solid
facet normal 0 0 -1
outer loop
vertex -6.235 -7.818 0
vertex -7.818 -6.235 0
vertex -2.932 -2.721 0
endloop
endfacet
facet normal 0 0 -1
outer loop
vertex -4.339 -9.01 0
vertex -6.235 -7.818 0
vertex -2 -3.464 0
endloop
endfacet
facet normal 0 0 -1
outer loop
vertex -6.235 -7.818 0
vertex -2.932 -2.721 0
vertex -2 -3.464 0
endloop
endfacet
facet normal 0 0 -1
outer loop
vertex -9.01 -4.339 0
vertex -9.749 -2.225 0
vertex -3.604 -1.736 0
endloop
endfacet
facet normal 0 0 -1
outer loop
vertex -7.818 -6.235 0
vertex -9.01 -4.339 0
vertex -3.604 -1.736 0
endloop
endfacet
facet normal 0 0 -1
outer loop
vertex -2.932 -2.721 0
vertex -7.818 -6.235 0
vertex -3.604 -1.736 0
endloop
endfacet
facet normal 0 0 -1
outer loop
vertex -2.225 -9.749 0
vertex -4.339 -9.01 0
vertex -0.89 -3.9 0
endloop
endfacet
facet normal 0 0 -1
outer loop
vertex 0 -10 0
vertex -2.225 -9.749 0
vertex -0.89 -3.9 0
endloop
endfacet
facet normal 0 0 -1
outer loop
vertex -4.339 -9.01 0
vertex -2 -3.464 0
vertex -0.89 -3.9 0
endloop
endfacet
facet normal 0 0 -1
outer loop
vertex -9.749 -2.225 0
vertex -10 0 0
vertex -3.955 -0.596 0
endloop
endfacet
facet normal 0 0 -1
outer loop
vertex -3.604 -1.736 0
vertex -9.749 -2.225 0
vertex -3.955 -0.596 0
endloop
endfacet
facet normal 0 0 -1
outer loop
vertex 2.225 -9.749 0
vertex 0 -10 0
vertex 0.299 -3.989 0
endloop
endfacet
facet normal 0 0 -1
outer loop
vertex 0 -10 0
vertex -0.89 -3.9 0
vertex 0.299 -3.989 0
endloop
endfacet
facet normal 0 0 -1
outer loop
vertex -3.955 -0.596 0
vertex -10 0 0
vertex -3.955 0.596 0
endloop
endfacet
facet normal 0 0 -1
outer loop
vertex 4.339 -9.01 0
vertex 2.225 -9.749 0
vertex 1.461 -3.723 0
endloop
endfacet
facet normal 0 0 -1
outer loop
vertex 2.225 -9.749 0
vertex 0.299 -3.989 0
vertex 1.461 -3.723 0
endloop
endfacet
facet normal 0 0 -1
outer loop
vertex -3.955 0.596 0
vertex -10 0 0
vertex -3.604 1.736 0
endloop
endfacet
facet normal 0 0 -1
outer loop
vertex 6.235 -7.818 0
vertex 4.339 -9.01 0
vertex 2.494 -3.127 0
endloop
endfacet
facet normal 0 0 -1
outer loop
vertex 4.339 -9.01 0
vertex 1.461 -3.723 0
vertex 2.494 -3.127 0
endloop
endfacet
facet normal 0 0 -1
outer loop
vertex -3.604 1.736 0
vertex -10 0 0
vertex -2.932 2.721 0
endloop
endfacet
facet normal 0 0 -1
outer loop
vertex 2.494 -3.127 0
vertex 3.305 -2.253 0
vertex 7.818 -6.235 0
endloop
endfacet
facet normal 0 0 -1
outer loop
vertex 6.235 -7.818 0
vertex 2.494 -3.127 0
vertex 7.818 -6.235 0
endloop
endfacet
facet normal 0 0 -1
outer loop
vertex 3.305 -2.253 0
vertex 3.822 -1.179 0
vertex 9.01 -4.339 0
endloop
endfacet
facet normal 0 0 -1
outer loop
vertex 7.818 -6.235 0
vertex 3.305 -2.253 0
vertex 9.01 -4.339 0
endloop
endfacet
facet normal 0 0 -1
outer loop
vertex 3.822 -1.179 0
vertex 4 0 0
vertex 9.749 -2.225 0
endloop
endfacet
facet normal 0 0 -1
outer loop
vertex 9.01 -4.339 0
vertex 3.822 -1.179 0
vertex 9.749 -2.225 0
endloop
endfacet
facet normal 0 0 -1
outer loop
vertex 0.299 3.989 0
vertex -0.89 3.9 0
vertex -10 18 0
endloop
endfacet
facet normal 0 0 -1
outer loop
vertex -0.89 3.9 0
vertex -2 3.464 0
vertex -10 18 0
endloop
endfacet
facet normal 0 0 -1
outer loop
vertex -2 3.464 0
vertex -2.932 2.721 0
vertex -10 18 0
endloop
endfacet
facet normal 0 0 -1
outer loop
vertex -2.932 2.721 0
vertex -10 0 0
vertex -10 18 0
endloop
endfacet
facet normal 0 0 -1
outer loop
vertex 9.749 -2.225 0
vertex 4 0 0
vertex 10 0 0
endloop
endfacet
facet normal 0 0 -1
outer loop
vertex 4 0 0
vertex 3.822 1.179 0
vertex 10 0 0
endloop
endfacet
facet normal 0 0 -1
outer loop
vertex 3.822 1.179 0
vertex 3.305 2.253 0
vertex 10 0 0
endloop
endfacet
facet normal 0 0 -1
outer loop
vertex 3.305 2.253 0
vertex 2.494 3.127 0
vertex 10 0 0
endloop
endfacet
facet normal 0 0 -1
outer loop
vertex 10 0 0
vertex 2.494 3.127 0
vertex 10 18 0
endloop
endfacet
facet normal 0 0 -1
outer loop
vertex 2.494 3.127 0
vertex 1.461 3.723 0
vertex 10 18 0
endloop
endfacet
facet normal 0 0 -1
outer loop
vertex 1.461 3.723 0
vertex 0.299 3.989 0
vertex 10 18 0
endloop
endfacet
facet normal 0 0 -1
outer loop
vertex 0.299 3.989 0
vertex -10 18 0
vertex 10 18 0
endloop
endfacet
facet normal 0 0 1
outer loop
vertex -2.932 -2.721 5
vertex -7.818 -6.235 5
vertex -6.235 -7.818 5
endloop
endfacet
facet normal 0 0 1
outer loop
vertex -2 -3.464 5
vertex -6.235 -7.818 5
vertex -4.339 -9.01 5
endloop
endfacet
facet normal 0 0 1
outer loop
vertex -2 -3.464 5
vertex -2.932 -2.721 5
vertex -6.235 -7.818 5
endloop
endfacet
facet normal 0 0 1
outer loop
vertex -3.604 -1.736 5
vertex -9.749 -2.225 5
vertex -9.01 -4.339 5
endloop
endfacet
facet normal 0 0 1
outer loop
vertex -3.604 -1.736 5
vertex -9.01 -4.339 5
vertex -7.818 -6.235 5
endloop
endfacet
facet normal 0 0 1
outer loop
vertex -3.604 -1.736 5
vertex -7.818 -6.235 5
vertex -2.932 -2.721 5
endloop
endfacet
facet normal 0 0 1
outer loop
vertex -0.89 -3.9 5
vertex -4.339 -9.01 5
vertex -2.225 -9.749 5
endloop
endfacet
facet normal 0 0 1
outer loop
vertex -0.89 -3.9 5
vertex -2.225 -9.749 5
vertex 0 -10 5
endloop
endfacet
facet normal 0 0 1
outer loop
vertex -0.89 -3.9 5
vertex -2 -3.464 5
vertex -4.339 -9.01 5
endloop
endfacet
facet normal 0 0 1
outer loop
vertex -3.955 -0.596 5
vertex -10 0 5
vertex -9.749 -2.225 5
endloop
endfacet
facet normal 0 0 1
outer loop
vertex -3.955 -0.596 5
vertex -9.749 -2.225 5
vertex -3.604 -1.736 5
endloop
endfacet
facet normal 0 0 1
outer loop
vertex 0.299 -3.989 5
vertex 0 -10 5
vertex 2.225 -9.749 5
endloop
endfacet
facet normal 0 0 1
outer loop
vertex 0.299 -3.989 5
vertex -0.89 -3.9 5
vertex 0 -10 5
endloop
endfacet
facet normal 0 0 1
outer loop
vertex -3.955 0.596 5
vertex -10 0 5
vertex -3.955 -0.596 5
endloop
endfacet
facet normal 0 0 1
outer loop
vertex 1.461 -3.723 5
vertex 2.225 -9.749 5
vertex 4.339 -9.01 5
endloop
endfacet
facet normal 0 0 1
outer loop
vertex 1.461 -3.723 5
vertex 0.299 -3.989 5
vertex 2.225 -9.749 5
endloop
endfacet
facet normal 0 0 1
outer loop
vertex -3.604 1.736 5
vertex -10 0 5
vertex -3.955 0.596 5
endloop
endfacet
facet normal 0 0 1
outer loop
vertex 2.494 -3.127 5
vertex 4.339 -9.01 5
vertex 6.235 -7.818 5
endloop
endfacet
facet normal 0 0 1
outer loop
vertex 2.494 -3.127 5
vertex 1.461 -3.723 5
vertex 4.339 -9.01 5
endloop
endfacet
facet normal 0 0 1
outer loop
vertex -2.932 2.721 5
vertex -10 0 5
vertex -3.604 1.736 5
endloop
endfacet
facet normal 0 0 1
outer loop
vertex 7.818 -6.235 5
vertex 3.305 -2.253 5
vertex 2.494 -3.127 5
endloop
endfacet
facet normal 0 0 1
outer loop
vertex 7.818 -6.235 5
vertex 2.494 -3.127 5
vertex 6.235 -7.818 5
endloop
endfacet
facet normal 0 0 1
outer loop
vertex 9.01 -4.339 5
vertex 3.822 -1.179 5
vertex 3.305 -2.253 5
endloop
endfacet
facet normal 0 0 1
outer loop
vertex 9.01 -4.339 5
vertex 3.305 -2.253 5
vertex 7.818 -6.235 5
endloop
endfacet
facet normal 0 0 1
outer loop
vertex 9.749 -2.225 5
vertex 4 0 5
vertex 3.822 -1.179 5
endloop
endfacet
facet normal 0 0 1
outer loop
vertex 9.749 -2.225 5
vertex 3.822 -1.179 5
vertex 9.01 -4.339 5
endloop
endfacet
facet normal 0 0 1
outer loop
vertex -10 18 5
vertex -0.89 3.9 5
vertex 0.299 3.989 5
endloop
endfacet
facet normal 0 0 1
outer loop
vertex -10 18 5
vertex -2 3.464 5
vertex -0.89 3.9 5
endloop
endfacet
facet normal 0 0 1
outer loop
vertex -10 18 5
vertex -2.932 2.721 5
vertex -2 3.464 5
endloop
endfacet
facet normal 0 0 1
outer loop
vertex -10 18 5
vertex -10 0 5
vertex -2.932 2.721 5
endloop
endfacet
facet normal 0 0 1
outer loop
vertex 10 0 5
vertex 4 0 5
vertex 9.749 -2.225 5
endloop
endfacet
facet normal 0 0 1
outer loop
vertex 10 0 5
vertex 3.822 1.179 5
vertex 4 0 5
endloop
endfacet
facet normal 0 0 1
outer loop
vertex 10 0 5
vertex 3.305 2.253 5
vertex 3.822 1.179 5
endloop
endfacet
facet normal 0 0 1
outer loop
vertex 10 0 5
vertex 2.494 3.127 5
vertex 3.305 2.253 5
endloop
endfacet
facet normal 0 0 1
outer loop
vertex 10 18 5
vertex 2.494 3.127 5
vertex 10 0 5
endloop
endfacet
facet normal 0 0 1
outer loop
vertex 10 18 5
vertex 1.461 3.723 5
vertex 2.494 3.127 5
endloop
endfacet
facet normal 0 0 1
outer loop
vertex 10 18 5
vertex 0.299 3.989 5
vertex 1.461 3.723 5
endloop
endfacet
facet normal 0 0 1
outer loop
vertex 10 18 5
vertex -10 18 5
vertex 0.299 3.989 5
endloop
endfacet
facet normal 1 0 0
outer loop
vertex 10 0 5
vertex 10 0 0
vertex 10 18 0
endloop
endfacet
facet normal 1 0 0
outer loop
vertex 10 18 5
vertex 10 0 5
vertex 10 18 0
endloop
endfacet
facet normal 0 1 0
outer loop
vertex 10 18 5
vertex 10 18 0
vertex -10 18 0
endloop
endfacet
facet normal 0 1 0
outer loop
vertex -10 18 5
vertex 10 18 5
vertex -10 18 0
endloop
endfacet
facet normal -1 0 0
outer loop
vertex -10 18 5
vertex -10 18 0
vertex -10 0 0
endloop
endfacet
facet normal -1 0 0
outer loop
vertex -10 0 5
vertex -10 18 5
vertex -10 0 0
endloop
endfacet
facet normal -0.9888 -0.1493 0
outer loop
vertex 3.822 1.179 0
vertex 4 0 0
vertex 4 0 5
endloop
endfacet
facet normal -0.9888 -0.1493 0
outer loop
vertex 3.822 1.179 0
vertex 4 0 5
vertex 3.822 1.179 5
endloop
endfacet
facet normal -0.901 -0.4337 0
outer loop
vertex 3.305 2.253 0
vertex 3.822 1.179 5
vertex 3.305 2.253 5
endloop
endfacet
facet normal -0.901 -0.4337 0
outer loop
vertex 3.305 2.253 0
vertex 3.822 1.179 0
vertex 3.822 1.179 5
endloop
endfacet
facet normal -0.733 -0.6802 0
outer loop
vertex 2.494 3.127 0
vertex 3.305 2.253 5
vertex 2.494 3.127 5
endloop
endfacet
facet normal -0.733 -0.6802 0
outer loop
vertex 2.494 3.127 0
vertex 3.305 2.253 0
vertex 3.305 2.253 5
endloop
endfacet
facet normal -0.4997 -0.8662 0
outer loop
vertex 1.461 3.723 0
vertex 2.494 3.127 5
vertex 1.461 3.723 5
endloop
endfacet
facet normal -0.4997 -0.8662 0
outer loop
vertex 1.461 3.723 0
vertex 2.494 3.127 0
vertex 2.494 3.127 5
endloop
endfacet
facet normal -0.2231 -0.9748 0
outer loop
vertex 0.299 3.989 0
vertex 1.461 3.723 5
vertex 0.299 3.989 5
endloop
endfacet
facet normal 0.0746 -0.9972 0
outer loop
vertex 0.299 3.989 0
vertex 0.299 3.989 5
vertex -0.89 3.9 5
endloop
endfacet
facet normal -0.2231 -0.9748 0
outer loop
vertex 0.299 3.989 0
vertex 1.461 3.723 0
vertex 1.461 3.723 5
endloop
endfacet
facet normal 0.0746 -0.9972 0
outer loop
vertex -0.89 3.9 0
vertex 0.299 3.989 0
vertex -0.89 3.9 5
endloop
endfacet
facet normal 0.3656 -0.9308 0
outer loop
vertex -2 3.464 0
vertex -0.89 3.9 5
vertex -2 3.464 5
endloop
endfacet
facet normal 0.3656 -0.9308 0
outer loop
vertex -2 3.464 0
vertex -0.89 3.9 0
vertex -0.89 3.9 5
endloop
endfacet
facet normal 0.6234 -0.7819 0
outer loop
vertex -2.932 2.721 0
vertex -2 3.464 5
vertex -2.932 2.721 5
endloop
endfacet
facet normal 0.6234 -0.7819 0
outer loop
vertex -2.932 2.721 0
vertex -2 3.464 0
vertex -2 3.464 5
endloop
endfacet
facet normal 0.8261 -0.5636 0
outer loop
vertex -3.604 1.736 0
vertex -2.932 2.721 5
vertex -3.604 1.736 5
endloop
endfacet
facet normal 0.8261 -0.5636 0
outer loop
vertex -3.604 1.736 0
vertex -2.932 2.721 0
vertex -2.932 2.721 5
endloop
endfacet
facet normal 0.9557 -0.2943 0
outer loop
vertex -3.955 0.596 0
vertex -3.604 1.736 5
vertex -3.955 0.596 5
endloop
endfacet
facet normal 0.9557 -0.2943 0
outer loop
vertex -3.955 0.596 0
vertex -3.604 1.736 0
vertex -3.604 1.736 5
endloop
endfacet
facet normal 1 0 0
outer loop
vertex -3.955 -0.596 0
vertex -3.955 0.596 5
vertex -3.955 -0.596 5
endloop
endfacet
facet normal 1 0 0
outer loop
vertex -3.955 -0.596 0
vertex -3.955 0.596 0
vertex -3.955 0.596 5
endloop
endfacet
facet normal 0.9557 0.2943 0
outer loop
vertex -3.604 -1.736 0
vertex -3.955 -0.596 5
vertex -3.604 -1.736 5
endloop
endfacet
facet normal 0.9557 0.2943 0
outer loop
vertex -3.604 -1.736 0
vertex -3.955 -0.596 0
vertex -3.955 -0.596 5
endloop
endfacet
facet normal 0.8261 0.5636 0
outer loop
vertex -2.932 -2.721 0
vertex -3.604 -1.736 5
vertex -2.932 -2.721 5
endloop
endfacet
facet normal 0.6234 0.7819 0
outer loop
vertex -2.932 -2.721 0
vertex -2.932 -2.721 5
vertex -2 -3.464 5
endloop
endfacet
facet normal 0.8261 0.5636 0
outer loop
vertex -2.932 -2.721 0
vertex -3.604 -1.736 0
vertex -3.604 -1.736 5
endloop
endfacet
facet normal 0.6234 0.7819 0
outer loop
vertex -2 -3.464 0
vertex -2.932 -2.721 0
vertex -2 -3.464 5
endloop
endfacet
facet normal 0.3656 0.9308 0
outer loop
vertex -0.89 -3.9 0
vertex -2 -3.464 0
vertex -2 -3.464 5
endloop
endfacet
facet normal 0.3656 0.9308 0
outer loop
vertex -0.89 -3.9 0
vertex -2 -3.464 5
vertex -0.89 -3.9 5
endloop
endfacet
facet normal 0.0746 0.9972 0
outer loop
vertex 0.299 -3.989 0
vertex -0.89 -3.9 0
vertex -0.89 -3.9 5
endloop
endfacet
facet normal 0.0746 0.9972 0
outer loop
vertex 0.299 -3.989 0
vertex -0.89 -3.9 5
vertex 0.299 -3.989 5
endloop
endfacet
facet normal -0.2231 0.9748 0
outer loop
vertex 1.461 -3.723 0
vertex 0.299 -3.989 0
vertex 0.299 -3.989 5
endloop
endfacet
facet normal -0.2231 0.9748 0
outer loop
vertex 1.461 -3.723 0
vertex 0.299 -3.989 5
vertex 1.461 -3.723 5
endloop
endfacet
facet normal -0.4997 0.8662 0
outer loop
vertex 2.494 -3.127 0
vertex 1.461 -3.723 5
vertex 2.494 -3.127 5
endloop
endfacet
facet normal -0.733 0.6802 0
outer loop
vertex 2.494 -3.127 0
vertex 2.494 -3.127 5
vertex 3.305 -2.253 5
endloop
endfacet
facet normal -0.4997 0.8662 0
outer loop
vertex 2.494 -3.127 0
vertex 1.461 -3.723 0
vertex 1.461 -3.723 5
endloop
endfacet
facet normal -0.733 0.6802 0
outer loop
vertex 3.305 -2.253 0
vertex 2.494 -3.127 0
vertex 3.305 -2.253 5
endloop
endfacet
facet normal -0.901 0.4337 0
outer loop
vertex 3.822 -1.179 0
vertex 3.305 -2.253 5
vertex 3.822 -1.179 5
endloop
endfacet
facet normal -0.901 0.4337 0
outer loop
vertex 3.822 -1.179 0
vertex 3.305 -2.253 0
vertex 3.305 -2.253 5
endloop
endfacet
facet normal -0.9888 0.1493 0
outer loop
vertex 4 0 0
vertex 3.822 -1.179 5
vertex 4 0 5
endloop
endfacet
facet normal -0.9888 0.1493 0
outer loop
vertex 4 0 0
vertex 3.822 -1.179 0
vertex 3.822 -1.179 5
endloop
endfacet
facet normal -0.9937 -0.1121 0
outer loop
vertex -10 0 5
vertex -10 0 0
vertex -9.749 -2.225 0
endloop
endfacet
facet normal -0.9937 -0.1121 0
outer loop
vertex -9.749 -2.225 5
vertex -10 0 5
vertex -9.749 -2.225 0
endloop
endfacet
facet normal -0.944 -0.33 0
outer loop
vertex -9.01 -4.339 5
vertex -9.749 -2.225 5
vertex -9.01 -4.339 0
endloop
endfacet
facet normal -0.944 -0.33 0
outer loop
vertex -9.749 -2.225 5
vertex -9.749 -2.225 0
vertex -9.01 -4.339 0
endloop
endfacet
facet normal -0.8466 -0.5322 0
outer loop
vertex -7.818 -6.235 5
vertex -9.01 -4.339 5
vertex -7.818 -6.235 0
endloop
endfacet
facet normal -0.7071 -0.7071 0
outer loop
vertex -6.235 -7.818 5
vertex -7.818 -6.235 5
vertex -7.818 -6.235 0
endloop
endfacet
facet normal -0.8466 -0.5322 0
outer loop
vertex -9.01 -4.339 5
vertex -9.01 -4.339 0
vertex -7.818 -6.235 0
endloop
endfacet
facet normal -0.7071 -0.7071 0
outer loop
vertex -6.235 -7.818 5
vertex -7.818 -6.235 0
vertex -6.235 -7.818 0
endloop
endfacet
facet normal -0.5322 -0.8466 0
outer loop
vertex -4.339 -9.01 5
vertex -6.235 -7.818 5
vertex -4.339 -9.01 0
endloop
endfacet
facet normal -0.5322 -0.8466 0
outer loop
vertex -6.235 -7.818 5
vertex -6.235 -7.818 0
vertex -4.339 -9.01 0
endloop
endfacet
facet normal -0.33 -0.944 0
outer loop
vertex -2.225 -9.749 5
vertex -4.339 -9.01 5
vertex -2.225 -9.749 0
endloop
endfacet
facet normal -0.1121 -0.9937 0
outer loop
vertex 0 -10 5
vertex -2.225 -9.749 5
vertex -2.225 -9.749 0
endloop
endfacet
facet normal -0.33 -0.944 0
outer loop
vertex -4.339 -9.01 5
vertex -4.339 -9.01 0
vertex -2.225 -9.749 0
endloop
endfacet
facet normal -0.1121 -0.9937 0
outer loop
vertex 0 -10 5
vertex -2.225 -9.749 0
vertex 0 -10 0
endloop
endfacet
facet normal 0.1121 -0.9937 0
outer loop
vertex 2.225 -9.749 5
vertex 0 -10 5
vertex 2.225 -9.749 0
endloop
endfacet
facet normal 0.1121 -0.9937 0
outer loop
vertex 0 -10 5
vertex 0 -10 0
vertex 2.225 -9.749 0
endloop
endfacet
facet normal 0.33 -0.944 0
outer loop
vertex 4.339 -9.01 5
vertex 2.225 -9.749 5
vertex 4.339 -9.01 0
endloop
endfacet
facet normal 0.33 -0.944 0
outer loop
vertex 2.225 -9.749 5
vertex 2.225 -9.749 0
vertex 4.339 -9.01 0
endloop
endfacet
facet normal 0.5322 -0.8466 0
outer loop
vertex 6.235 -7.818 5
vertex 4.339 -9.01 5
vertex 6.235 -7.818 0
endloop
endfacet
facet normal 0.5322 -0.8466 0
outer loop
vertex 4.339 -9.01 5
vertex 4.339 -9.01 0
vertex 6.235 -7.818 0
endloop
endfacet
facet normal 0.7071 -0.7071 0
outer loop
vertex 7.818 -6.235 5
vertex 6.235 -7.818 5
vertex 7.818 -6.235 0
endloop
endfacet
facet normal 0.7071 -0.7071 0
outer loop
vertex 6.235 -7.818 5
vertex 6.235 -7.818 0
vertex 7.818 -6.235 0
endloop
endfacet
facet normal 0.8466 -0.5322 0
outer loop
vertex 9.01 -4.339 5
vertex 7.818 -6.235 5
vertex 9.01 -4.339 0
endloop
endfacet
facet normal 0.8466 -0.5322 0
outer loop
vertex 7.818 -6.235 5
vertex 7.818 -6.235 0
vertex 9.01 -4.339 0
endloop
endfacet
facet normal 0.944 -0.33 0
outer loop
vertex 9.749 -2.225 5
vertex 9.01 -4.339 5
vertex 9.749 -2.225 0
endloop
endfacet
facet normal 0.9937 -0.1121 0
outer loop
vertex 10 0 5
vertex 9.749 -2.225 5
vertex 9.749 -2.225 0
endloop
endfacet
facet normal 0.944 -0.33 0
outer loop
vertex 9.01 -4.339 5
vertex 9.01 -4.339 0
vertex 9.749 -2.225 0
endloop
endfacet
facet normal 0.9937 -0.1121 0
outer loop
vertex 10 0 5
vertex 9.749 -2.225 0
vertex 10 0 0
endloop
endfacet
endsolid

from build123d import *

# Parameters (mm, degrees)
IZIM1_R                     = 4
Y_KSEKLIK_EKSTR_ZYON1_DEPTH = 5


with BuildPart() as part:
    # Çizim1 → Yükseklik-Ekstrüzyon1 (new body)
    with BuildSketch(Plane.XY):
        with BuildLine():
            Line((-10, 15), (-10, 0))
            ThreePointArc((-10, 0), (0, -10), (10, 0))
            Line((10, 0), (10, 15))
            Line((10, 15), (10, 18))
            Line((10, 18), (-10, 18))
            Line((-10, 18), (-10, 15))
        make_face()
        Circle(IZIM1_R, mode=Mode.SUBTRACT)
    extrude(amount=Y_KSEKLIK_EKSTR_ZYON1_DEPTH)


solid = part.part
